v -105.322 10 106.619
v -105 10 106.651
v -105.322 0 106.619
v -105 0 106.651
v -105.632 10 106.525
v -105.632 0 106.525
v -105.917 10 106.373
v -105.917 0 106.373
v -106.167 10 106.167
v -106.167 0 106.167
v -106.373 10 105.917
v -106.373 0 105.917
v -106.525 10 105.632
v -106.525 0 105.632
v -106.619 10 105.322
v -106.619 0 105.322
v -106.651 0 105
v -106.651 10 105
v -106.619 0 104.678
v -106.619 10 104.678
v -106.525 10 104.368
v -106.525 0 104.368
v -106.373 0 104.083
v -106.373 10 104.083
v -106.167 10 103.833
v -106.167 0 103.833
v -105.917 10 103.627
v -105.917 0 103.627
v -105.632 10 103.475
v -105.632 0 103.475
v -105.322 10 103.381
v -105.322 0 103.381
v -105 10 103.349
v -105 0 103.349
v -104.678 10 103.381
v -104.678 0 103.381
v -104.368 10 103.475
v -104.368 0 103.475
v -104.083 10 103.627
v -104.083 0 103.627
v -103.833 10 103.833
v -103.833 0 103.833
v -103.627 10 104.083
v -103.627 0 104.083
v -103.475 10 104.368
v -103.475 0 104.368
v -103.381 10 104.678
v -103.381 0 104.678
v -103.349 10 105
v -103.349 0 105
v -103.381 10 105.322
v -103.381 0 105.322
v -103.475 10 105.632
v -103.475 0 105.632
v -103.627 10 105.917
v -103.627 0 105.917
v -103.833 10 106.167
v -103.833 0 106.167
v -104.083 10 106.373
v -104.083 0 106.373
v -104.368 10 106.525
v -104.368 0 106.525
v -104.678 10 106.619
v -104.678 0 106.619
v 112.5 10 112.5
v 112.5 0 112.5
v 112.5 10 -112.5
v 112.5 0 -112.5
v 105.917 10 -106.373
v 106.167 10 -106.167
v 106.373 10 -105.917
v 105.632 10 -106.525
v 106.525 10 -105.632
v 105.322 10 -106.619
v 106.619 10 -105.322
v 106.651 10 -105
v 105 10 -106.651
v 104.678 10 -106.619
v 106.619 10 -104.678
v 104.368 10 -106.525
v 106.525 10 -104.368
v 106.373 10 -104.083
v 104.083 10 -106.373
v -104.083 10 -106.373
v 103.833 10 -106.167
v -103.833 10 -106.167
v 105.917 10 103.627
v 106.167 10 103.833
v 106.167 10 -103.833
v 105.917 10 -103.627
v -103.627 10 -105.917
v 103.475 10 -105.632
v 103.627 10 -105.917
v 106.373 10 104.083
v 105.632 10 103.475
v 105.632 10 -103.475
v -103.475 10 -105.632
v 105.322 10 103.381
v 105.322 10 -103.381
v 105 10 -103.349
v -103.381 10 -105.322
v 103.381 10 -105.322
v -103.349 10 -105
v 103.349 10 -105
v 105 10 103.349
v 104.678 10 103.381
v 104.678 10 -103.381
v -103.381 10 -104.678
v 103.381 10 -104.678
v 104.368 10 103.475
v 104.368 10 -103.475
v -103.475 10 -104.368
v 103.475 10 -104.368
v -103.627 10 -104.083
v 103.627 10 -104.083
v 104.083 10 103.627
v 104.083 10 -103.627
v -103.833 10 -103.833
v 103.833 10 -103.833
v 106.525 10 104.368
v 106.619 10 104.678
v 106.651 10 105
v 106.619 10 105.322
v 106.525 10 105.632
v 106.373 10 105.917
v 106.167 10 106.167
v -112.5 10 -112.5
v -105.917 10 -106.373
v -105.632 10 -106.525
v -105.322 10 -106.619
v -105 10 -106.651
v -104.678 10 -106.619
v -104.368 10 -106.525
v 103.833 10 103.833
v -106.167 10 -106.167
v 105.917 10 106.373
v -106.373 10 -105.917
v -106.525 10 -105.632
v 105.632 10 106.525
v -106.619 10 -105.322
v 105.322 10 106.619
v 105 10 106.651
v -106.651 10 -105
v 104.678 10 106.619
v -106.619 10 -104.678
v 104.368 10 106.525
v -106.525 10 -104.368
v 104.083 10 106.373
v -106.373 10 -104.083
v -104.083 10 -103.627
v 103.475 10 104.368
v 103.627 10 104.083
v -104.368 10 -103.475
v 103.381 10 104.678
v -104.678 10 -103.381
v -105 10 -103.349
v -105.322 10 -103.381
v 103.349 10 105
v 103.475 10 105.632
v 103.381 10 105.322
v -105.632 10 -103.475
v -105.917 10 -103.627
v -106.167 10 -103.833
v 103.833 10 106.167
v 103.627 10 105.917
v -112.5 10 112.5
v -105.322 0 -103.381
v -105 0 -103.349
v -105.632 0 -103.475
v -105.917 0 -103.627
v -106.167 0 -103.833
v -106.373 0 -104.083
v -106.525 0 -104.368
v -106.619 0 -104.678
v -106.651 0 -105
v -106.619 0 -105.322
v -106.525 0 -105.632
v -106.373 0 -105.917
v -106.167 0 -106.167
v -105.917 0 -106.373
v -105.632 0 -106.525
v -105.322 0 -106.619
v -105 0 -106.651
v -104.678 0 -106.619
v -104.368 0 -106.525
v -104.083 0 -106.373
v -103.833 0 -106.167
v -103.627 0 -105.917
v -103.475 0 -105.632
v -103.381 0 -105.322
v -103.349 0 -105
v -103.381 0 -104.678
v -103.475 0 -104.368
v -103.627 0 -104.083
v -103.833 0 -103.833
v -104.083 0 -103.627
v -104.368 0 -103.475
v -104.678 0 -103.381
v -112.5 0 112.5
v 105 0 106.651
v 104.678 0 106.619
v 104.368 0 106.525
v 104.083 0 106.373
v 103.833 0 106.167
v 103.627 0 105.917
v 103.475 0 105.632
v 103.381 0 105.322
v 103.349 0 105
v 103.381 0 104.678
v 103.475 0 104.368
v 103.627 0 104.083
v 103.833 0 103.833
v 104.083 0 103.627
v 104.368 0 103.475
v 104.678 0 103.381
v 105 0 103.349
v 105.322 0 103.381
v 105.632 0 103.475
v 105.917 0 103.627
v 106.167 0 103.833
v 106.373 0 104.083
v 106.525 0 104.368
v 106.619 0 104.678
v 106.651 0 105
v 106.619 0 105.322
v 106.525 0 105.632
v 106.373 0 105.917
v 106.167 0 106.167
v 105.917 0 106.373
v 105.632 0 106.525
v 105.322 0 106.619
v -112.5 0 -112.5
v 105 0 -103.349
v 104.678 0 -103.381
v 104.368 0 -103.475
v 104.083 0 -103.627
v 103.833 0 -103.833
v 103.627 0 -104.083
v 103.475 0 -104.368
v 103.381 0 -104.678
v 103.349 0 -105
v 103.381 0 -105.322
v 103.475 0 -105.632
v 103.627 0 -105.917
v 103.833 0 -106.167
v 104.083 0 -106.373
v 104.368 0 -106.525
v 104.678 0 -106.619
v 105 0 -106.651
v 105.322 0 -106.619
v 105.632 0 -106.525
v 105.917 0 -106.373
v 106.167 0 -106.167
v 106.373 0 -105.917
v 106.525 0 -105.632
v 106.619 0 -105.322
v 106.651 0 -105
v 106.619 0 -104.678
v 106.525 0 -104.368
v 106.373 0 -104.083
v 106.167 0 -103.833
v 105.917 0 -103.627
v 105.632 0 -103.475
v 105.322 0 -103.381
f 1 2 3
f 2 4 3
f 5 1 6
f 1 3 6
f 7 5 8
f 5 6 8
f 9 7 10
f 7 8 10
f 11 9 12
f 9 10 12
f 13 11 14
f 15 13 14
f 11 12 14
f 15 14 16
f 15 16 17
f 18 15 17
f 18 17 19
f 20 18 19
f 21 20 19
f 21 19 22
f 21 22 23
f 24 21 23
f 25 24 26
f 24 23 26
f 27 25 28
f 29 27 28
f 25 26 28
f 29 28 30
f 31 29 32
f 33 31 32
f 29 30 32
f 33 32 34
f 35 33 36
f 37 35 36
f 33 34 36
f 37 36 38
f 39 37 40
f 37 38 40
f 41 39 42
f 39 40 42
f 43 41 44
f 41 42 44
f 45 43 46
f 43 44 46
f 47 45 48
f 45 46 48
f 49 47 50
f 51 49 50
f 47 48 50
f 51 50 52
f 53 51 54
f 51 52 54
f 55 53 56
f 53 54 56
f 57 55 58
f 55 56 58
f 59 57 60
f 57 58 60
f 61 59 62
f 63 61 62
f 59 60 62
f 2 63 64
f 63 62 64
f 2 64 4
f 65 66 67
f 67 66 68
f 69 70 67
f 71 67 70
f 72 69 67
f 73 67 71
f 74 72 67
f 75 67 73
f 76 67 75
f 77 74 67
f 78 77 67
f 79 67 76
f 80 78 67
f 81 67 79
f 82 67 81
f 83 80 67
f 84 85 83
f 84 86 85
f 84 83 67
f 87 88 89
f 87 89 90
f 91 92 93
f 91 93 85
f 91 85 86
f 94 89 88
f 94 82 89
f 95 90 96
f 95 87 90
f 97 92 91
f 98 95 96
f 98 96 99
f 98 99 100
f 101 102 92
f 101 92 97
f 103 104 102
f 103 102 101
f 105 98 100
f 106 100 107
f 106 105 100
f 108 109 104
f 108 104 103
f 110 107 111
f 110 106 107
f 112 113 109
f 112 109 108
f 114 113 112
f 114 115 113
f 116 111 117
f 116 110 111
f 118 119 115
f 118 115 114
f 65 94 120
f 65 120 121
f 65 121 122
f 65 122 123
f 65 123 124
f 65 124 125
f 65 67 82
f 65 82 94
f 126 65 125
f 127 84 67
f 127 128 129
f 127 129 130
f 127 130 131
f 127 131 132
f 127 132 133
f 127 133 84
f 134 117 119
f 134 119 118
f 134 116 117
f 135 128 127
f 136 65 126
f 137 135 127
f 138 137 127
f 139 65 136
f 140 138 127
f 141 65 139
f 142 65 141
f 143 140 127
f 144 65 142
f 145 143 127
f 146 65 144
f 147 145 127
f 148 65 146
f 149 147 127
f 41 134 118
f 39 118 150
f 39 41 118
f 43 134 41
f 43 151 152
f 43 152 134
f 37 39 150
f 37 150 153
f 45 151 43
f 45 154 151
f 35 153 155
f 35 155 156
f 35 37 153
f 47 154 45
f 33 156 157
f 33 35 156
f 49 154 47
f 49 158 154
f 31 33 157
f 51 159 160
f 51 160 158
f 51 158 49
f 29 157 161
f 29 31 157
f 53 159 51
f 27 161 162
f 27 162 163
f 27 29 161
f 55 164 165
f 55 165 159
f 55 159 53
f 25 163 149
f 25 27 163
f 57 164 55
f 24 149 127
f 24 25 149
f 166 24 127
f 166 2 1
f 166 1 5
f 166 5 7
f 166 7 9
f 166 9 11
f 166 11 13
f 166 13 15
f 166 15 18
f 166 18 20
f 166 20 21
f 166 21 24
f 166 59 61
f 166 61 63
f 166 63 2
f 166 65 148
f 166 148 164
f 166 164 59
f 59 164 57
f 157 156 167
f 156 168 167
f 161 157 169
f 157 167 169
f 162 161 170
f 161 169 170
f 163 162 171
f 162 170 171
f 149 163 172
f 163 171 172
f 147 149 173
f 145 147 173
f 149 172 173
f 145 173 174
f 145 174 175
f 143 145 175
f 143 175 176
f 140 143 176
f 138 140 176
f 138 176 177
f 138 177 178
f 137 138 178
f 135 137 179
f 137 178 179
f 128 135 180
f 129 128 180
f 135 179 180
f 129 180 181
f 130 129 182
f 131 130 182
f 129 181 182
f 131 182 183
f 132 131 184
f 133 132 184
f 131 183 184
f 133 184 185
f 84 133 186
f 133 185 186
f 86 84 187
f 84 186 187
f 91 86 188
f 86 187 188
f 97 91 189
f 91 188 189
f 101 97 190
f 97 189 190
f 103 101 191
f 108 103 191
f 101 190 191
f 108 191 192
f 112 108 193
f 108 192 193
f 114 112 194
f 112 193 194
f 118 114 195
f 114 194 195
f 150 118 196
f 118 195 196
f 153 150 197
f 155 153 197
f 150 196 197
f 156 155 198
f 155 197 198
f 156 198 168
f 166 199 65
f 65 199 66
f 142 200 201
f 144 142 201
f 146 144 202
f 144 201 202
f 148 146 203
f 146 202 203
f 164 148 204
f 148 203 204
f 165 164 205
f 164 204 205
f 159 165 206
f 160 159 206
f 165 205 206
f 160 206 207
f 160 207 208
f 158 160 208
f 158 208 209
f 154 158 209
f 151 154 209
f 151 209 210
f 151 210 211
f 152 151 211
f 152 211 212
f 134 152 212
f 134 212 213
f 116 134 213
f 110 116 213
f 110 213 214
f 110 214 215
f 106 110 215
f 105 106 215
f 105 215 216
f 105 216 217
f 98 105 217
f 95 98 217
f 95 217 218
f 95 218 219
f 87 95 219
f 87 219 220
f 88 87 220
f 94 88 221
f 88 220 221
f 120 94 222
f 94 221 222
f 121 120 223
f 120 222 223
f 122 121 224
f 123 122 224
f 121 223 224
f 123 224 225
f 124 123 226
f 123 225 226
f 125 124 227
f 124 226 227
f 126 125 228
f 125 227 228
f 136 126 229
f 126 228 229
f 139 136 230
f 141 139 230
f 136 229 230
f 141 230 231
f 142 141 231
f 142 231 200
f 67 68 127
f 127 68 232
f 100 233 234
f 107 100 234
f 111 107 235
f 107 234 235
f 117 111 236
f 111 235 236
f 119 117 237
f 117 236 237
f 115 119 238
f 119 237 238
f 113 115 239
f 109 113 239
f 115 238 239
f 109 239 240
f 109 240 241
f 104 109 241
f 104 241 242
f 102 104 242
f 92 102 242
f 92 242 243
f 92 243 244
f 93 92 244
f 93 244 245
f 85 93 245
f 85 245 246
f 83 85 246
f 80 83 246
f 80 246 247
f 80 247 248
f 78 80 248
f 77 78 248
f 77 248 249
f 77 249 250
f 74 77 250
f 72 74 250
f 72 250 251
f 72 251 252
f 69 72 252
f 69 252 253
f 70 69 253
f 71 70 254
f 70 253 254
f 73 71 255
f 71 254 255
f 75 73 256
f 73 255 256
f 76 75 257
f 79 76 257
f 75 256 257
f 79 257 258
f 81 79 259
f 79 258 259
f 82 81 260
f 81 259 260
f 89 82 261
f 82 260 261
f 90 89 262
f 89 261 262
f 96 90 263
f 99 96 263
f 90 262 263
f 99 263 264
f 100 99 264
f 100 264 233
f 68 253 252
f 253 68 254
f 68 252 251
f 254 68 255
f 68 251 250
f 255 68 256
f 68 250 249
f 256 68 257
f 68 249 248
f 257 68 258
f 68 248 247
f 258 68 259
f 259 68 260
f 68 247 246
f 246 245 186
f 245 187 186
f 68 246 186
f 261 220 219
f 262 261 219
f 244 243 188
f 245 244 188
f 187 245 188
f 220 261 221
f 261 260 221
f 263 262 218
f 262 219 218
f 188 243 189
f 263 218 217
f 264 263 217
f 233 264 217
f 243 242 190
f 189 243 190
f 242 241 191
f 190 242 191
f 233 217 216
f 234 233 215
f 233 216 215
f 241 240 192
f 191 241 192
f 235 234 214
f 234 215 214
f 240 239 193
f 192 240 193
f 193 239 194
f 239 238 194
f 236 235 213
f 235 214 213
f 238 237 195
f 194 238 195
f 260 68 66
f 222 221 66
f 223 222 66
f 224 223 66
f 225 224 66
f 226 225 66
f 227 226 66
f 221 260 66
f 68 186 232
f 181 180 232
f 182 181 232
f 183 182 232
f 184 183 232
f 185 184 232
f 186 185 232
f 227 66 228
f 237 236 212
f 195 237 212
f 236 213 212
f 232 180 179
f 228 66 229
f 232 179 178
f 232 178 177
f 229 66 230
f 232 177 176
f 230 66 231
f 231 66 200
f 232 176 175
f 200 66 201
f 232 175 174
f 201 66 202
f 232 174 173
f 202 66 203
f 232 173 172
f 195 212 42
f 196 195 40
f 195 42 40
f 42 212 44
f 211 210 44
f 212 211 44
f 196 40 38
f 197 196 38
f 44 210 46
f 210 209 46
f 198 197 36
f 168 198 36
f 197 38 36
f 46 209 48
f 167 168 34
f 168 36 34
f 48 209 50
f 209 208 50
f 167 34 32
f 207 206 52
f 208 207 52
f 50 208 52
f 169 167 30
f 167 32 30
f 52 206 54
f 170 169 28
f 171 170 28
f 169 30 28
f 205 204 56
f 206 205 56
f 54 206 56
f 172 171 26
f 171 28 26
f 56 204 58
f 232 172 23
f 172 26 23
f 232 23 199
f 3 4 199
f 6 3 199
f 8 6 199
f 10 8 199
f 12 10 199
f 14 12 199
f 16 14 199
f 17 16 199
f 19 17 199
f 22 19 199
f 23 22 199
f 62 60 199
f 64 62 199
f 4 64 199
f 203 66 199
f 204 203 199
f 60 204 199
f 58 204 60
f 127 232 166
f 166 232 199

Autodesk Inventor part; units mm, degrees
ref_plane "YZ Plane" through (0, 0, 0) normal (1, 0, 0) x (0, 1, 0)
ref_plane "XZ Plane" through (0, 0, 0) normal (0, 1, 0) x (-1, 0, 0)
ref_plane "XY Plane" through (0, 0, 0) normal (0, 0, 1) x (1, 0, 0)
sketch "Sketch1" plane through (0, 0, 0) normal (0, 1, 0) x (-1, 0, 0)
  line L0 (112.5, 112.5) -> (-112.5, 112.5)
  line L1 (-112.5, 112.5) -> (-112.5, -112.5)
  line L2 (-112.5, -112.5) -> (112.5, -112.5)
  line L3 (112.5, -112.5) -> (112.5, 112.5)
  point P0 (0, 0)
  dimension "d0" = 225
  dimension "d1" = 225
extrude "Extrusion1" add sketch "Sketch1" along normal blind 10
sketch "Sketch2" plane through (0, 10, 0) normal (0, 1, 0) x (1, 0, 0)
  line L0 (-112.5, -112.5) -> (112.5, -112.5) projected
  line L1 (112.5, -112.5) -> (112.5, -105)
  line L2 (112.5, -112.5) -> (112.5, 112.5) projected
  line L3 (112.5, -105) -> (105, -105)
  line L4 (105, -105) -> (105, 105)
  line L5 (105, 105) -> (-105, 105)
  line L6 (-105, 105) -> (-105, -105)
  line L7 (-105, -105) -> (105, -105)
  point P0 (0, 0)
  dimension "d4" = 7.5
  dimension "d5" = 7.5
  dimension "d6" = 210
  dimension "d7" = 90
  dimension "d8" = 210
  dimension "d9" = 90
  dimension "d10" = 210
  dimension "d11" = 90
hole "Hole1" at (-105, 10, 105) at (-105, 10, -105) at (105, 10, -105) at (105, 10, 105) direction (0, -1, 0) diameter 3.302 depth 12.3 thread size "8-32 UNC" class "2B" standard "ANSI Unified Screw Threads"
properties part number "bakeoutbox lid"
